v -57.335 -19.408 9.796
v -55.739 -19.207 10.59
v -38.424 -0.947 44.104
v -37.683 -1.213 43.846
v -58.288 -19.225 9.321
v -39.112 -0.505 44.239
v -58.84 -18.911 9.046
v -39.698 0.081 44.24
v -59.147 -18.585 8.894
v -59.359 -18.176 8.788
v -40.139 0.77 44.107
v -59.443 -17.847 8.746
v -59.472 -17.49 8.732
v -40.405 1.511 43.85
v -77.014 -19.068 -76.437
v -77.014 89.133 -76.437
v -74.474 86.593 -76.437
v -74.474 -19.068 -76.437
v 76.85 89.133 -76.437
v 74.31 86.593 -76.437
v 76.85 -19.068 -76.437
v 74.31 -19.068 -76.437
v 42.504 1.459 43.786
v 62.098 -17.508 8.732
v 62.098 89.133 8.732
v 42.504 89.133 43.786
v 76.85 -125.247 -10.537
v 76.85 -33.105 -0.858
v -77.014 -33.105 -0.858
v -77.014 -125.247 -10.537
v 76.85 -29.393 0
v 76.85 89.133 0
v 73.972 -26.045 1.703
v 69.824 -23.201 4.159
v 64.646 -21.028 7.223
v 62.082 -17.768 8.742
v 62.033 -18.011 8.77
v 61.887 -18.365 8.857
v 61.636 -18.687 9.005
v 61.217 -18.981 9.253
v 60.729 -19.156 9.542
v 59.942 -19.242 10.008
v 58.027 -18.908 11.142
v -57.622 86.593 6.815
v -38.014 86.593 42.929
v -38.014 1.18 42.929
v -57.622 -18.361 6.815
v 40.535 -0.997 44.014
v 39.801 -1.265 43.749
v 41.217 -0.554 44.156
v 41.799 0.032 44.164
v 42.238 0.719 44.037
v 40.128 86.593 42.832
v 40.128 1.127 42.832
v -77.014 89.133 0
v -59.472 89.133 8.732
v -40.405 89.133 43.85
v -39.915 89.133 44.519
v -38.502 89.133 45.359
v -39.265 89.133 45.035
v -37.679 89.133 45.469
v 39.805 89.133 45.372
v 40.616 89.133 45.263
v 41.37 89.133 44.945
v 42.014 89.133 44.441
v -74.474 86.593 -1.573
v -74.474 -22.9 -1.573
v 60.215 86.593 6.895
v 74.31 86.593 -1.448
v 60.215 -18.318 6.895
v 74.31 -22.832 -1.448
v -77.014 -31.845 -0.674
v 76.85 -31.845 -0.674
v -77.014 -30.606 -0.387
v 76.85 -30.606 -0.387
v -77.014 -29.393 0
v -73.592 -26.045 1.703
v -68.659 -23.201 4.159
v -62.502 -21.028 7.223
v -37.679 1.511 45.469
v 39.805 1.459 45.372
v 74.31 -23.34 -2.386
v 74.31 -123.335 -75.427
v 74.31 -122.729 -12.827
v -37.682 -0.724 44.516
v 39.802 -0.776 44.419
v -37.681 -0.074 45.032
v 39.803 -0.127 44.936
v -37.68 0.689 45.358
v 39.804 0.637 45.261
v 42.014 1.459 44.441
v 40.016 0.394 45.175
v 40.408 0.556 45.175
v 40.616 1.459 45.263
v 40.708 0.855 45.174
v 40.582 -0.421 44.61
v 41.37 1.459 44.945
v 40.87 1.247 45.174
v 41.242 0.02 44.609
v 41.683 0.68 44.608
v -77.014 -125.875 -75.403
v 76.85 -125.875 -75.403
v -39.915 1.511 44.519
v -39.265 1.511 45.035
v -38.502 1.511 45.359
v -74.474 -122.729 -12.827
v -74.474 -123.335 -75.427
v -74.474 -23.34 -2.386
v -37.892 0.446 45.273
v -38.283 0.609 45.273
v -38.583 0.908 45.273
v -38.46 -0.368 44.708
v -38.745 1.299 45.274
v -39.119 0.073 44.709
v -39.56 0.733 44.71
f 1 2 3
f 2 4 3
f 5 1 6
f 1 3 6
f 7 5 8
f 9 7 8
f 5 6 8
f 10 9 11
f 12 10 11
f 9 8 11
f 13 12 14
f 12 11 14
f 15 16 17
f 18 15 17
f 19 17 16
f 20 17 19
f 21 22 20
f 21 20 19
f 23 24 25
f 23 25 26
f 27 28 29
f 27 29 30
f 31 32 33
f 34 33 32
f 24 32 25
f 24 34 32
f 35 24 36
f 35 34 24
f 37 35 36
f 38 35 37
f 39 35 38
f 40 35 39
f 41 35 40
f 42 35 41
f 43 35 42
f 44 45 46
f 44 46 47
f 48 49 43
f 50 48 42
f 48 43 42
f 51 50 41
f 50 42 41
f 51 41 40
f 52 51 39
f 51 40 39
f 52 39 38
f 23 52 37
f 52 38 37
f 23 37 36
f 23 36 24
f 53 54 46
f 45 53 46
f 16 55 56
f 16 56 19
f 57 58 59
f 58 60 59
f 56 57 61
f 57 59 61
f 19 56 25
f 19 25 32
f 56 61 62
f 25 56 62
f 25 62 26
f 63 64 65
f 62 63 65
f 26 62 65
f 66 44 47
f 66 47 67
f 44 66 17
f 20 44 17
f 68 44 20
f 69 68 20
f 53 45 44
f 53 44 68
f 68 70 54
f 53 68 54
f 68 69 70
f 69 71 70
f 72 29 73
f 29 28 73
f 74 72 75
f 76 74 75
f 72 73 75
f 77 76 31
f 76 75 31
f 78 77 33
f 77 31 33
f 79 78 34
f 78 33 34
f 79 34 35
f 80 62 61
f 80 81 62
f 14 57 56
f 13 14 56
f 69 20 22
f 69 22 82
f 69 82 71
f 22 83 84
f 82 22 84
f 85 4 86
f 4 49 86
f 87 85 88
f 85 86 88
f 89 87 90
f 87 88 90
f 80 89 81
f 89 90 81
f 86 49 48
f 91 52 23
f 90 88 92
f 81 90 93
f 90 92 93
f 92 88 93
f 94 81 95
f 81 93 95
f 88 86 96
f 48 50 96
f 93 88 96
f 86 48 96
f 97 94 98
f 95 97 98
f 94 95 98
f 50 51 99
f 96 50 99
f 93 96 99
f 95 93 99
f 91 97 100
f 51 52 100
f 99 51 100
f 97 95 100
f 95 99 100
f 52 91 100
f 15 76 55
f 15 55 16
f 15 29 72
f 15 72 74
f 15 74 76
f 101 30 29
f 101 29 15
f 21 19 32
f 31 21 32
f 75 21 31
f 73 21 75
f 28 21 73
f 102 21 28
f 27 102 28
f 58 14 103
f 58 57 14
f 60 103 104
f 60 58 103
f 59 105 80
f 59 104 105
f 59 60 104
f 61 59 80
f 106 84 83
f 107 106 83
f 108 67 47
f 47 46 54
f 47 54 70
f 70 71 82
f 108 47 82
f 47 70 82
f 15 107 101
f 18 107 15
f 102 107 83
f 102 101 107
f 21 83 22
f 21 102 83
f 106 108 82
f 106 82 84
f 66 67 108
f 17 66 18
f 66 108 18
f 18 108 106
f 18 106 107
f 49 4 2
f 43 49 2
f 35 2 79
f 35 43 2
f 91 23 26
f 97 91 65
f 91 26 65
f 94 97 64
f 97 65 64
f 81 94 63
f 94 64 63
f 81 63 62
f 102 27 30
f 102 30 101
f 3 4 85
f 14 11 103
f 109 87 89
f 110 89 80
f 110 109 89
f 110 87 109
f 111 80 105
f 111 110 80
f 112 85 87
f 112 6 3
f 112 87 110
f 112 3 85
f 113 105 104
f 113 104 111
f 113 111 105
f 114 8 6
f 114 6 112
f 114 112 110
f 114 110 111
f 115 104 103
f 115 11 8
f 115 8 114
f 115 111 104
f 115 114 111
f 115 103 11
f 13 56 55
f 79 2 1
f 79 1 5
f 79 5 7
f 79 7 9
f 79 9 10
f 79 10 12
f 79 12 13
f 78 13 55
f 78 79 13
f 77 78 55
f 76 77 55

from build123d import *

# Parameters (mm, degrees)
F1_DEPTH = 89.1325119883
F3_DEPTH = 77.1384909749
F4_DEPTH = 218.7686692923
F5_T     = -2.54
F6_R     = 15.5818396181
F7_R     = 3.0969406223


with BuildPart() as f1:
    # F0 (on Front) → F1 (new body)
    with BuildSketch(Plane.XZ):
        Polygon((-77.014118433, 0), (-77.014118433, -76.4366090298), (76.849937439, -76.4366090298), (76.849937439, 0), (62.097877264, 8.7319239974), (41.6193008423, 45.3698374331), (-39.5245552063, 45.4712845385), (-59.4715923071, 8.7319239974), align=None)
    extrude(amount=-F1_DEPTH)

    # F2 (on Right) → F3 (join, symmetric)
    with BuildSketch(Plane.YZ):
        Polygon((0, -76.6211944324), (0, 46.0868030787), (-24.9364376068, 0), (-125.2473463191, -10.5374917338), (-125.8752644062, -75.4026770592), align=None)
    extrude(amount=F3_DEPTH, both=True)

    # F4 (cut): a face of the model
    f4_faces = [f1.faces().sort_by_distance(p)[0] for p in [
        (76.9413650258, 0, -15.2671956769),
    ]]
    extrude(f4_faces, amount=-F4_DEPTH, mode=Mode.SUBTRACT)

    # F5
    f5_openings = [f1.faces().sort_by_distance(p)[0] for p in [
        (-0.08209, -72.471652, -75.919643),
        (-0.08209, 35.032237, -76.436609),
    ]]
    offset(amount=F5_T, openings=f5_openings, kind=Kind.INTERSECTION)

    # F6
    f6_edges = [f1.edges().sort_by_distance(p)[0] for p in [
        (-0.08209, -24.936438, 0),
    ]]
    fillet(f6_edges, radius=F6_R)

    # F7
    f7_edges = [f1.edges().sort_by_distance(p)[0] for p in [
        (-49.498074, -10.272425, 27.101604),
        (51.858589, -10.29987, 27.050881),
        (1.047373, -0.360487, 45.420561),
        (41.619301, 44.37229, 45.369837),
        (-39.524555, 44.399735, 45.471285),
    ]]
    fillet(f7_edges, radius=F7_R)


solid = f1.part
